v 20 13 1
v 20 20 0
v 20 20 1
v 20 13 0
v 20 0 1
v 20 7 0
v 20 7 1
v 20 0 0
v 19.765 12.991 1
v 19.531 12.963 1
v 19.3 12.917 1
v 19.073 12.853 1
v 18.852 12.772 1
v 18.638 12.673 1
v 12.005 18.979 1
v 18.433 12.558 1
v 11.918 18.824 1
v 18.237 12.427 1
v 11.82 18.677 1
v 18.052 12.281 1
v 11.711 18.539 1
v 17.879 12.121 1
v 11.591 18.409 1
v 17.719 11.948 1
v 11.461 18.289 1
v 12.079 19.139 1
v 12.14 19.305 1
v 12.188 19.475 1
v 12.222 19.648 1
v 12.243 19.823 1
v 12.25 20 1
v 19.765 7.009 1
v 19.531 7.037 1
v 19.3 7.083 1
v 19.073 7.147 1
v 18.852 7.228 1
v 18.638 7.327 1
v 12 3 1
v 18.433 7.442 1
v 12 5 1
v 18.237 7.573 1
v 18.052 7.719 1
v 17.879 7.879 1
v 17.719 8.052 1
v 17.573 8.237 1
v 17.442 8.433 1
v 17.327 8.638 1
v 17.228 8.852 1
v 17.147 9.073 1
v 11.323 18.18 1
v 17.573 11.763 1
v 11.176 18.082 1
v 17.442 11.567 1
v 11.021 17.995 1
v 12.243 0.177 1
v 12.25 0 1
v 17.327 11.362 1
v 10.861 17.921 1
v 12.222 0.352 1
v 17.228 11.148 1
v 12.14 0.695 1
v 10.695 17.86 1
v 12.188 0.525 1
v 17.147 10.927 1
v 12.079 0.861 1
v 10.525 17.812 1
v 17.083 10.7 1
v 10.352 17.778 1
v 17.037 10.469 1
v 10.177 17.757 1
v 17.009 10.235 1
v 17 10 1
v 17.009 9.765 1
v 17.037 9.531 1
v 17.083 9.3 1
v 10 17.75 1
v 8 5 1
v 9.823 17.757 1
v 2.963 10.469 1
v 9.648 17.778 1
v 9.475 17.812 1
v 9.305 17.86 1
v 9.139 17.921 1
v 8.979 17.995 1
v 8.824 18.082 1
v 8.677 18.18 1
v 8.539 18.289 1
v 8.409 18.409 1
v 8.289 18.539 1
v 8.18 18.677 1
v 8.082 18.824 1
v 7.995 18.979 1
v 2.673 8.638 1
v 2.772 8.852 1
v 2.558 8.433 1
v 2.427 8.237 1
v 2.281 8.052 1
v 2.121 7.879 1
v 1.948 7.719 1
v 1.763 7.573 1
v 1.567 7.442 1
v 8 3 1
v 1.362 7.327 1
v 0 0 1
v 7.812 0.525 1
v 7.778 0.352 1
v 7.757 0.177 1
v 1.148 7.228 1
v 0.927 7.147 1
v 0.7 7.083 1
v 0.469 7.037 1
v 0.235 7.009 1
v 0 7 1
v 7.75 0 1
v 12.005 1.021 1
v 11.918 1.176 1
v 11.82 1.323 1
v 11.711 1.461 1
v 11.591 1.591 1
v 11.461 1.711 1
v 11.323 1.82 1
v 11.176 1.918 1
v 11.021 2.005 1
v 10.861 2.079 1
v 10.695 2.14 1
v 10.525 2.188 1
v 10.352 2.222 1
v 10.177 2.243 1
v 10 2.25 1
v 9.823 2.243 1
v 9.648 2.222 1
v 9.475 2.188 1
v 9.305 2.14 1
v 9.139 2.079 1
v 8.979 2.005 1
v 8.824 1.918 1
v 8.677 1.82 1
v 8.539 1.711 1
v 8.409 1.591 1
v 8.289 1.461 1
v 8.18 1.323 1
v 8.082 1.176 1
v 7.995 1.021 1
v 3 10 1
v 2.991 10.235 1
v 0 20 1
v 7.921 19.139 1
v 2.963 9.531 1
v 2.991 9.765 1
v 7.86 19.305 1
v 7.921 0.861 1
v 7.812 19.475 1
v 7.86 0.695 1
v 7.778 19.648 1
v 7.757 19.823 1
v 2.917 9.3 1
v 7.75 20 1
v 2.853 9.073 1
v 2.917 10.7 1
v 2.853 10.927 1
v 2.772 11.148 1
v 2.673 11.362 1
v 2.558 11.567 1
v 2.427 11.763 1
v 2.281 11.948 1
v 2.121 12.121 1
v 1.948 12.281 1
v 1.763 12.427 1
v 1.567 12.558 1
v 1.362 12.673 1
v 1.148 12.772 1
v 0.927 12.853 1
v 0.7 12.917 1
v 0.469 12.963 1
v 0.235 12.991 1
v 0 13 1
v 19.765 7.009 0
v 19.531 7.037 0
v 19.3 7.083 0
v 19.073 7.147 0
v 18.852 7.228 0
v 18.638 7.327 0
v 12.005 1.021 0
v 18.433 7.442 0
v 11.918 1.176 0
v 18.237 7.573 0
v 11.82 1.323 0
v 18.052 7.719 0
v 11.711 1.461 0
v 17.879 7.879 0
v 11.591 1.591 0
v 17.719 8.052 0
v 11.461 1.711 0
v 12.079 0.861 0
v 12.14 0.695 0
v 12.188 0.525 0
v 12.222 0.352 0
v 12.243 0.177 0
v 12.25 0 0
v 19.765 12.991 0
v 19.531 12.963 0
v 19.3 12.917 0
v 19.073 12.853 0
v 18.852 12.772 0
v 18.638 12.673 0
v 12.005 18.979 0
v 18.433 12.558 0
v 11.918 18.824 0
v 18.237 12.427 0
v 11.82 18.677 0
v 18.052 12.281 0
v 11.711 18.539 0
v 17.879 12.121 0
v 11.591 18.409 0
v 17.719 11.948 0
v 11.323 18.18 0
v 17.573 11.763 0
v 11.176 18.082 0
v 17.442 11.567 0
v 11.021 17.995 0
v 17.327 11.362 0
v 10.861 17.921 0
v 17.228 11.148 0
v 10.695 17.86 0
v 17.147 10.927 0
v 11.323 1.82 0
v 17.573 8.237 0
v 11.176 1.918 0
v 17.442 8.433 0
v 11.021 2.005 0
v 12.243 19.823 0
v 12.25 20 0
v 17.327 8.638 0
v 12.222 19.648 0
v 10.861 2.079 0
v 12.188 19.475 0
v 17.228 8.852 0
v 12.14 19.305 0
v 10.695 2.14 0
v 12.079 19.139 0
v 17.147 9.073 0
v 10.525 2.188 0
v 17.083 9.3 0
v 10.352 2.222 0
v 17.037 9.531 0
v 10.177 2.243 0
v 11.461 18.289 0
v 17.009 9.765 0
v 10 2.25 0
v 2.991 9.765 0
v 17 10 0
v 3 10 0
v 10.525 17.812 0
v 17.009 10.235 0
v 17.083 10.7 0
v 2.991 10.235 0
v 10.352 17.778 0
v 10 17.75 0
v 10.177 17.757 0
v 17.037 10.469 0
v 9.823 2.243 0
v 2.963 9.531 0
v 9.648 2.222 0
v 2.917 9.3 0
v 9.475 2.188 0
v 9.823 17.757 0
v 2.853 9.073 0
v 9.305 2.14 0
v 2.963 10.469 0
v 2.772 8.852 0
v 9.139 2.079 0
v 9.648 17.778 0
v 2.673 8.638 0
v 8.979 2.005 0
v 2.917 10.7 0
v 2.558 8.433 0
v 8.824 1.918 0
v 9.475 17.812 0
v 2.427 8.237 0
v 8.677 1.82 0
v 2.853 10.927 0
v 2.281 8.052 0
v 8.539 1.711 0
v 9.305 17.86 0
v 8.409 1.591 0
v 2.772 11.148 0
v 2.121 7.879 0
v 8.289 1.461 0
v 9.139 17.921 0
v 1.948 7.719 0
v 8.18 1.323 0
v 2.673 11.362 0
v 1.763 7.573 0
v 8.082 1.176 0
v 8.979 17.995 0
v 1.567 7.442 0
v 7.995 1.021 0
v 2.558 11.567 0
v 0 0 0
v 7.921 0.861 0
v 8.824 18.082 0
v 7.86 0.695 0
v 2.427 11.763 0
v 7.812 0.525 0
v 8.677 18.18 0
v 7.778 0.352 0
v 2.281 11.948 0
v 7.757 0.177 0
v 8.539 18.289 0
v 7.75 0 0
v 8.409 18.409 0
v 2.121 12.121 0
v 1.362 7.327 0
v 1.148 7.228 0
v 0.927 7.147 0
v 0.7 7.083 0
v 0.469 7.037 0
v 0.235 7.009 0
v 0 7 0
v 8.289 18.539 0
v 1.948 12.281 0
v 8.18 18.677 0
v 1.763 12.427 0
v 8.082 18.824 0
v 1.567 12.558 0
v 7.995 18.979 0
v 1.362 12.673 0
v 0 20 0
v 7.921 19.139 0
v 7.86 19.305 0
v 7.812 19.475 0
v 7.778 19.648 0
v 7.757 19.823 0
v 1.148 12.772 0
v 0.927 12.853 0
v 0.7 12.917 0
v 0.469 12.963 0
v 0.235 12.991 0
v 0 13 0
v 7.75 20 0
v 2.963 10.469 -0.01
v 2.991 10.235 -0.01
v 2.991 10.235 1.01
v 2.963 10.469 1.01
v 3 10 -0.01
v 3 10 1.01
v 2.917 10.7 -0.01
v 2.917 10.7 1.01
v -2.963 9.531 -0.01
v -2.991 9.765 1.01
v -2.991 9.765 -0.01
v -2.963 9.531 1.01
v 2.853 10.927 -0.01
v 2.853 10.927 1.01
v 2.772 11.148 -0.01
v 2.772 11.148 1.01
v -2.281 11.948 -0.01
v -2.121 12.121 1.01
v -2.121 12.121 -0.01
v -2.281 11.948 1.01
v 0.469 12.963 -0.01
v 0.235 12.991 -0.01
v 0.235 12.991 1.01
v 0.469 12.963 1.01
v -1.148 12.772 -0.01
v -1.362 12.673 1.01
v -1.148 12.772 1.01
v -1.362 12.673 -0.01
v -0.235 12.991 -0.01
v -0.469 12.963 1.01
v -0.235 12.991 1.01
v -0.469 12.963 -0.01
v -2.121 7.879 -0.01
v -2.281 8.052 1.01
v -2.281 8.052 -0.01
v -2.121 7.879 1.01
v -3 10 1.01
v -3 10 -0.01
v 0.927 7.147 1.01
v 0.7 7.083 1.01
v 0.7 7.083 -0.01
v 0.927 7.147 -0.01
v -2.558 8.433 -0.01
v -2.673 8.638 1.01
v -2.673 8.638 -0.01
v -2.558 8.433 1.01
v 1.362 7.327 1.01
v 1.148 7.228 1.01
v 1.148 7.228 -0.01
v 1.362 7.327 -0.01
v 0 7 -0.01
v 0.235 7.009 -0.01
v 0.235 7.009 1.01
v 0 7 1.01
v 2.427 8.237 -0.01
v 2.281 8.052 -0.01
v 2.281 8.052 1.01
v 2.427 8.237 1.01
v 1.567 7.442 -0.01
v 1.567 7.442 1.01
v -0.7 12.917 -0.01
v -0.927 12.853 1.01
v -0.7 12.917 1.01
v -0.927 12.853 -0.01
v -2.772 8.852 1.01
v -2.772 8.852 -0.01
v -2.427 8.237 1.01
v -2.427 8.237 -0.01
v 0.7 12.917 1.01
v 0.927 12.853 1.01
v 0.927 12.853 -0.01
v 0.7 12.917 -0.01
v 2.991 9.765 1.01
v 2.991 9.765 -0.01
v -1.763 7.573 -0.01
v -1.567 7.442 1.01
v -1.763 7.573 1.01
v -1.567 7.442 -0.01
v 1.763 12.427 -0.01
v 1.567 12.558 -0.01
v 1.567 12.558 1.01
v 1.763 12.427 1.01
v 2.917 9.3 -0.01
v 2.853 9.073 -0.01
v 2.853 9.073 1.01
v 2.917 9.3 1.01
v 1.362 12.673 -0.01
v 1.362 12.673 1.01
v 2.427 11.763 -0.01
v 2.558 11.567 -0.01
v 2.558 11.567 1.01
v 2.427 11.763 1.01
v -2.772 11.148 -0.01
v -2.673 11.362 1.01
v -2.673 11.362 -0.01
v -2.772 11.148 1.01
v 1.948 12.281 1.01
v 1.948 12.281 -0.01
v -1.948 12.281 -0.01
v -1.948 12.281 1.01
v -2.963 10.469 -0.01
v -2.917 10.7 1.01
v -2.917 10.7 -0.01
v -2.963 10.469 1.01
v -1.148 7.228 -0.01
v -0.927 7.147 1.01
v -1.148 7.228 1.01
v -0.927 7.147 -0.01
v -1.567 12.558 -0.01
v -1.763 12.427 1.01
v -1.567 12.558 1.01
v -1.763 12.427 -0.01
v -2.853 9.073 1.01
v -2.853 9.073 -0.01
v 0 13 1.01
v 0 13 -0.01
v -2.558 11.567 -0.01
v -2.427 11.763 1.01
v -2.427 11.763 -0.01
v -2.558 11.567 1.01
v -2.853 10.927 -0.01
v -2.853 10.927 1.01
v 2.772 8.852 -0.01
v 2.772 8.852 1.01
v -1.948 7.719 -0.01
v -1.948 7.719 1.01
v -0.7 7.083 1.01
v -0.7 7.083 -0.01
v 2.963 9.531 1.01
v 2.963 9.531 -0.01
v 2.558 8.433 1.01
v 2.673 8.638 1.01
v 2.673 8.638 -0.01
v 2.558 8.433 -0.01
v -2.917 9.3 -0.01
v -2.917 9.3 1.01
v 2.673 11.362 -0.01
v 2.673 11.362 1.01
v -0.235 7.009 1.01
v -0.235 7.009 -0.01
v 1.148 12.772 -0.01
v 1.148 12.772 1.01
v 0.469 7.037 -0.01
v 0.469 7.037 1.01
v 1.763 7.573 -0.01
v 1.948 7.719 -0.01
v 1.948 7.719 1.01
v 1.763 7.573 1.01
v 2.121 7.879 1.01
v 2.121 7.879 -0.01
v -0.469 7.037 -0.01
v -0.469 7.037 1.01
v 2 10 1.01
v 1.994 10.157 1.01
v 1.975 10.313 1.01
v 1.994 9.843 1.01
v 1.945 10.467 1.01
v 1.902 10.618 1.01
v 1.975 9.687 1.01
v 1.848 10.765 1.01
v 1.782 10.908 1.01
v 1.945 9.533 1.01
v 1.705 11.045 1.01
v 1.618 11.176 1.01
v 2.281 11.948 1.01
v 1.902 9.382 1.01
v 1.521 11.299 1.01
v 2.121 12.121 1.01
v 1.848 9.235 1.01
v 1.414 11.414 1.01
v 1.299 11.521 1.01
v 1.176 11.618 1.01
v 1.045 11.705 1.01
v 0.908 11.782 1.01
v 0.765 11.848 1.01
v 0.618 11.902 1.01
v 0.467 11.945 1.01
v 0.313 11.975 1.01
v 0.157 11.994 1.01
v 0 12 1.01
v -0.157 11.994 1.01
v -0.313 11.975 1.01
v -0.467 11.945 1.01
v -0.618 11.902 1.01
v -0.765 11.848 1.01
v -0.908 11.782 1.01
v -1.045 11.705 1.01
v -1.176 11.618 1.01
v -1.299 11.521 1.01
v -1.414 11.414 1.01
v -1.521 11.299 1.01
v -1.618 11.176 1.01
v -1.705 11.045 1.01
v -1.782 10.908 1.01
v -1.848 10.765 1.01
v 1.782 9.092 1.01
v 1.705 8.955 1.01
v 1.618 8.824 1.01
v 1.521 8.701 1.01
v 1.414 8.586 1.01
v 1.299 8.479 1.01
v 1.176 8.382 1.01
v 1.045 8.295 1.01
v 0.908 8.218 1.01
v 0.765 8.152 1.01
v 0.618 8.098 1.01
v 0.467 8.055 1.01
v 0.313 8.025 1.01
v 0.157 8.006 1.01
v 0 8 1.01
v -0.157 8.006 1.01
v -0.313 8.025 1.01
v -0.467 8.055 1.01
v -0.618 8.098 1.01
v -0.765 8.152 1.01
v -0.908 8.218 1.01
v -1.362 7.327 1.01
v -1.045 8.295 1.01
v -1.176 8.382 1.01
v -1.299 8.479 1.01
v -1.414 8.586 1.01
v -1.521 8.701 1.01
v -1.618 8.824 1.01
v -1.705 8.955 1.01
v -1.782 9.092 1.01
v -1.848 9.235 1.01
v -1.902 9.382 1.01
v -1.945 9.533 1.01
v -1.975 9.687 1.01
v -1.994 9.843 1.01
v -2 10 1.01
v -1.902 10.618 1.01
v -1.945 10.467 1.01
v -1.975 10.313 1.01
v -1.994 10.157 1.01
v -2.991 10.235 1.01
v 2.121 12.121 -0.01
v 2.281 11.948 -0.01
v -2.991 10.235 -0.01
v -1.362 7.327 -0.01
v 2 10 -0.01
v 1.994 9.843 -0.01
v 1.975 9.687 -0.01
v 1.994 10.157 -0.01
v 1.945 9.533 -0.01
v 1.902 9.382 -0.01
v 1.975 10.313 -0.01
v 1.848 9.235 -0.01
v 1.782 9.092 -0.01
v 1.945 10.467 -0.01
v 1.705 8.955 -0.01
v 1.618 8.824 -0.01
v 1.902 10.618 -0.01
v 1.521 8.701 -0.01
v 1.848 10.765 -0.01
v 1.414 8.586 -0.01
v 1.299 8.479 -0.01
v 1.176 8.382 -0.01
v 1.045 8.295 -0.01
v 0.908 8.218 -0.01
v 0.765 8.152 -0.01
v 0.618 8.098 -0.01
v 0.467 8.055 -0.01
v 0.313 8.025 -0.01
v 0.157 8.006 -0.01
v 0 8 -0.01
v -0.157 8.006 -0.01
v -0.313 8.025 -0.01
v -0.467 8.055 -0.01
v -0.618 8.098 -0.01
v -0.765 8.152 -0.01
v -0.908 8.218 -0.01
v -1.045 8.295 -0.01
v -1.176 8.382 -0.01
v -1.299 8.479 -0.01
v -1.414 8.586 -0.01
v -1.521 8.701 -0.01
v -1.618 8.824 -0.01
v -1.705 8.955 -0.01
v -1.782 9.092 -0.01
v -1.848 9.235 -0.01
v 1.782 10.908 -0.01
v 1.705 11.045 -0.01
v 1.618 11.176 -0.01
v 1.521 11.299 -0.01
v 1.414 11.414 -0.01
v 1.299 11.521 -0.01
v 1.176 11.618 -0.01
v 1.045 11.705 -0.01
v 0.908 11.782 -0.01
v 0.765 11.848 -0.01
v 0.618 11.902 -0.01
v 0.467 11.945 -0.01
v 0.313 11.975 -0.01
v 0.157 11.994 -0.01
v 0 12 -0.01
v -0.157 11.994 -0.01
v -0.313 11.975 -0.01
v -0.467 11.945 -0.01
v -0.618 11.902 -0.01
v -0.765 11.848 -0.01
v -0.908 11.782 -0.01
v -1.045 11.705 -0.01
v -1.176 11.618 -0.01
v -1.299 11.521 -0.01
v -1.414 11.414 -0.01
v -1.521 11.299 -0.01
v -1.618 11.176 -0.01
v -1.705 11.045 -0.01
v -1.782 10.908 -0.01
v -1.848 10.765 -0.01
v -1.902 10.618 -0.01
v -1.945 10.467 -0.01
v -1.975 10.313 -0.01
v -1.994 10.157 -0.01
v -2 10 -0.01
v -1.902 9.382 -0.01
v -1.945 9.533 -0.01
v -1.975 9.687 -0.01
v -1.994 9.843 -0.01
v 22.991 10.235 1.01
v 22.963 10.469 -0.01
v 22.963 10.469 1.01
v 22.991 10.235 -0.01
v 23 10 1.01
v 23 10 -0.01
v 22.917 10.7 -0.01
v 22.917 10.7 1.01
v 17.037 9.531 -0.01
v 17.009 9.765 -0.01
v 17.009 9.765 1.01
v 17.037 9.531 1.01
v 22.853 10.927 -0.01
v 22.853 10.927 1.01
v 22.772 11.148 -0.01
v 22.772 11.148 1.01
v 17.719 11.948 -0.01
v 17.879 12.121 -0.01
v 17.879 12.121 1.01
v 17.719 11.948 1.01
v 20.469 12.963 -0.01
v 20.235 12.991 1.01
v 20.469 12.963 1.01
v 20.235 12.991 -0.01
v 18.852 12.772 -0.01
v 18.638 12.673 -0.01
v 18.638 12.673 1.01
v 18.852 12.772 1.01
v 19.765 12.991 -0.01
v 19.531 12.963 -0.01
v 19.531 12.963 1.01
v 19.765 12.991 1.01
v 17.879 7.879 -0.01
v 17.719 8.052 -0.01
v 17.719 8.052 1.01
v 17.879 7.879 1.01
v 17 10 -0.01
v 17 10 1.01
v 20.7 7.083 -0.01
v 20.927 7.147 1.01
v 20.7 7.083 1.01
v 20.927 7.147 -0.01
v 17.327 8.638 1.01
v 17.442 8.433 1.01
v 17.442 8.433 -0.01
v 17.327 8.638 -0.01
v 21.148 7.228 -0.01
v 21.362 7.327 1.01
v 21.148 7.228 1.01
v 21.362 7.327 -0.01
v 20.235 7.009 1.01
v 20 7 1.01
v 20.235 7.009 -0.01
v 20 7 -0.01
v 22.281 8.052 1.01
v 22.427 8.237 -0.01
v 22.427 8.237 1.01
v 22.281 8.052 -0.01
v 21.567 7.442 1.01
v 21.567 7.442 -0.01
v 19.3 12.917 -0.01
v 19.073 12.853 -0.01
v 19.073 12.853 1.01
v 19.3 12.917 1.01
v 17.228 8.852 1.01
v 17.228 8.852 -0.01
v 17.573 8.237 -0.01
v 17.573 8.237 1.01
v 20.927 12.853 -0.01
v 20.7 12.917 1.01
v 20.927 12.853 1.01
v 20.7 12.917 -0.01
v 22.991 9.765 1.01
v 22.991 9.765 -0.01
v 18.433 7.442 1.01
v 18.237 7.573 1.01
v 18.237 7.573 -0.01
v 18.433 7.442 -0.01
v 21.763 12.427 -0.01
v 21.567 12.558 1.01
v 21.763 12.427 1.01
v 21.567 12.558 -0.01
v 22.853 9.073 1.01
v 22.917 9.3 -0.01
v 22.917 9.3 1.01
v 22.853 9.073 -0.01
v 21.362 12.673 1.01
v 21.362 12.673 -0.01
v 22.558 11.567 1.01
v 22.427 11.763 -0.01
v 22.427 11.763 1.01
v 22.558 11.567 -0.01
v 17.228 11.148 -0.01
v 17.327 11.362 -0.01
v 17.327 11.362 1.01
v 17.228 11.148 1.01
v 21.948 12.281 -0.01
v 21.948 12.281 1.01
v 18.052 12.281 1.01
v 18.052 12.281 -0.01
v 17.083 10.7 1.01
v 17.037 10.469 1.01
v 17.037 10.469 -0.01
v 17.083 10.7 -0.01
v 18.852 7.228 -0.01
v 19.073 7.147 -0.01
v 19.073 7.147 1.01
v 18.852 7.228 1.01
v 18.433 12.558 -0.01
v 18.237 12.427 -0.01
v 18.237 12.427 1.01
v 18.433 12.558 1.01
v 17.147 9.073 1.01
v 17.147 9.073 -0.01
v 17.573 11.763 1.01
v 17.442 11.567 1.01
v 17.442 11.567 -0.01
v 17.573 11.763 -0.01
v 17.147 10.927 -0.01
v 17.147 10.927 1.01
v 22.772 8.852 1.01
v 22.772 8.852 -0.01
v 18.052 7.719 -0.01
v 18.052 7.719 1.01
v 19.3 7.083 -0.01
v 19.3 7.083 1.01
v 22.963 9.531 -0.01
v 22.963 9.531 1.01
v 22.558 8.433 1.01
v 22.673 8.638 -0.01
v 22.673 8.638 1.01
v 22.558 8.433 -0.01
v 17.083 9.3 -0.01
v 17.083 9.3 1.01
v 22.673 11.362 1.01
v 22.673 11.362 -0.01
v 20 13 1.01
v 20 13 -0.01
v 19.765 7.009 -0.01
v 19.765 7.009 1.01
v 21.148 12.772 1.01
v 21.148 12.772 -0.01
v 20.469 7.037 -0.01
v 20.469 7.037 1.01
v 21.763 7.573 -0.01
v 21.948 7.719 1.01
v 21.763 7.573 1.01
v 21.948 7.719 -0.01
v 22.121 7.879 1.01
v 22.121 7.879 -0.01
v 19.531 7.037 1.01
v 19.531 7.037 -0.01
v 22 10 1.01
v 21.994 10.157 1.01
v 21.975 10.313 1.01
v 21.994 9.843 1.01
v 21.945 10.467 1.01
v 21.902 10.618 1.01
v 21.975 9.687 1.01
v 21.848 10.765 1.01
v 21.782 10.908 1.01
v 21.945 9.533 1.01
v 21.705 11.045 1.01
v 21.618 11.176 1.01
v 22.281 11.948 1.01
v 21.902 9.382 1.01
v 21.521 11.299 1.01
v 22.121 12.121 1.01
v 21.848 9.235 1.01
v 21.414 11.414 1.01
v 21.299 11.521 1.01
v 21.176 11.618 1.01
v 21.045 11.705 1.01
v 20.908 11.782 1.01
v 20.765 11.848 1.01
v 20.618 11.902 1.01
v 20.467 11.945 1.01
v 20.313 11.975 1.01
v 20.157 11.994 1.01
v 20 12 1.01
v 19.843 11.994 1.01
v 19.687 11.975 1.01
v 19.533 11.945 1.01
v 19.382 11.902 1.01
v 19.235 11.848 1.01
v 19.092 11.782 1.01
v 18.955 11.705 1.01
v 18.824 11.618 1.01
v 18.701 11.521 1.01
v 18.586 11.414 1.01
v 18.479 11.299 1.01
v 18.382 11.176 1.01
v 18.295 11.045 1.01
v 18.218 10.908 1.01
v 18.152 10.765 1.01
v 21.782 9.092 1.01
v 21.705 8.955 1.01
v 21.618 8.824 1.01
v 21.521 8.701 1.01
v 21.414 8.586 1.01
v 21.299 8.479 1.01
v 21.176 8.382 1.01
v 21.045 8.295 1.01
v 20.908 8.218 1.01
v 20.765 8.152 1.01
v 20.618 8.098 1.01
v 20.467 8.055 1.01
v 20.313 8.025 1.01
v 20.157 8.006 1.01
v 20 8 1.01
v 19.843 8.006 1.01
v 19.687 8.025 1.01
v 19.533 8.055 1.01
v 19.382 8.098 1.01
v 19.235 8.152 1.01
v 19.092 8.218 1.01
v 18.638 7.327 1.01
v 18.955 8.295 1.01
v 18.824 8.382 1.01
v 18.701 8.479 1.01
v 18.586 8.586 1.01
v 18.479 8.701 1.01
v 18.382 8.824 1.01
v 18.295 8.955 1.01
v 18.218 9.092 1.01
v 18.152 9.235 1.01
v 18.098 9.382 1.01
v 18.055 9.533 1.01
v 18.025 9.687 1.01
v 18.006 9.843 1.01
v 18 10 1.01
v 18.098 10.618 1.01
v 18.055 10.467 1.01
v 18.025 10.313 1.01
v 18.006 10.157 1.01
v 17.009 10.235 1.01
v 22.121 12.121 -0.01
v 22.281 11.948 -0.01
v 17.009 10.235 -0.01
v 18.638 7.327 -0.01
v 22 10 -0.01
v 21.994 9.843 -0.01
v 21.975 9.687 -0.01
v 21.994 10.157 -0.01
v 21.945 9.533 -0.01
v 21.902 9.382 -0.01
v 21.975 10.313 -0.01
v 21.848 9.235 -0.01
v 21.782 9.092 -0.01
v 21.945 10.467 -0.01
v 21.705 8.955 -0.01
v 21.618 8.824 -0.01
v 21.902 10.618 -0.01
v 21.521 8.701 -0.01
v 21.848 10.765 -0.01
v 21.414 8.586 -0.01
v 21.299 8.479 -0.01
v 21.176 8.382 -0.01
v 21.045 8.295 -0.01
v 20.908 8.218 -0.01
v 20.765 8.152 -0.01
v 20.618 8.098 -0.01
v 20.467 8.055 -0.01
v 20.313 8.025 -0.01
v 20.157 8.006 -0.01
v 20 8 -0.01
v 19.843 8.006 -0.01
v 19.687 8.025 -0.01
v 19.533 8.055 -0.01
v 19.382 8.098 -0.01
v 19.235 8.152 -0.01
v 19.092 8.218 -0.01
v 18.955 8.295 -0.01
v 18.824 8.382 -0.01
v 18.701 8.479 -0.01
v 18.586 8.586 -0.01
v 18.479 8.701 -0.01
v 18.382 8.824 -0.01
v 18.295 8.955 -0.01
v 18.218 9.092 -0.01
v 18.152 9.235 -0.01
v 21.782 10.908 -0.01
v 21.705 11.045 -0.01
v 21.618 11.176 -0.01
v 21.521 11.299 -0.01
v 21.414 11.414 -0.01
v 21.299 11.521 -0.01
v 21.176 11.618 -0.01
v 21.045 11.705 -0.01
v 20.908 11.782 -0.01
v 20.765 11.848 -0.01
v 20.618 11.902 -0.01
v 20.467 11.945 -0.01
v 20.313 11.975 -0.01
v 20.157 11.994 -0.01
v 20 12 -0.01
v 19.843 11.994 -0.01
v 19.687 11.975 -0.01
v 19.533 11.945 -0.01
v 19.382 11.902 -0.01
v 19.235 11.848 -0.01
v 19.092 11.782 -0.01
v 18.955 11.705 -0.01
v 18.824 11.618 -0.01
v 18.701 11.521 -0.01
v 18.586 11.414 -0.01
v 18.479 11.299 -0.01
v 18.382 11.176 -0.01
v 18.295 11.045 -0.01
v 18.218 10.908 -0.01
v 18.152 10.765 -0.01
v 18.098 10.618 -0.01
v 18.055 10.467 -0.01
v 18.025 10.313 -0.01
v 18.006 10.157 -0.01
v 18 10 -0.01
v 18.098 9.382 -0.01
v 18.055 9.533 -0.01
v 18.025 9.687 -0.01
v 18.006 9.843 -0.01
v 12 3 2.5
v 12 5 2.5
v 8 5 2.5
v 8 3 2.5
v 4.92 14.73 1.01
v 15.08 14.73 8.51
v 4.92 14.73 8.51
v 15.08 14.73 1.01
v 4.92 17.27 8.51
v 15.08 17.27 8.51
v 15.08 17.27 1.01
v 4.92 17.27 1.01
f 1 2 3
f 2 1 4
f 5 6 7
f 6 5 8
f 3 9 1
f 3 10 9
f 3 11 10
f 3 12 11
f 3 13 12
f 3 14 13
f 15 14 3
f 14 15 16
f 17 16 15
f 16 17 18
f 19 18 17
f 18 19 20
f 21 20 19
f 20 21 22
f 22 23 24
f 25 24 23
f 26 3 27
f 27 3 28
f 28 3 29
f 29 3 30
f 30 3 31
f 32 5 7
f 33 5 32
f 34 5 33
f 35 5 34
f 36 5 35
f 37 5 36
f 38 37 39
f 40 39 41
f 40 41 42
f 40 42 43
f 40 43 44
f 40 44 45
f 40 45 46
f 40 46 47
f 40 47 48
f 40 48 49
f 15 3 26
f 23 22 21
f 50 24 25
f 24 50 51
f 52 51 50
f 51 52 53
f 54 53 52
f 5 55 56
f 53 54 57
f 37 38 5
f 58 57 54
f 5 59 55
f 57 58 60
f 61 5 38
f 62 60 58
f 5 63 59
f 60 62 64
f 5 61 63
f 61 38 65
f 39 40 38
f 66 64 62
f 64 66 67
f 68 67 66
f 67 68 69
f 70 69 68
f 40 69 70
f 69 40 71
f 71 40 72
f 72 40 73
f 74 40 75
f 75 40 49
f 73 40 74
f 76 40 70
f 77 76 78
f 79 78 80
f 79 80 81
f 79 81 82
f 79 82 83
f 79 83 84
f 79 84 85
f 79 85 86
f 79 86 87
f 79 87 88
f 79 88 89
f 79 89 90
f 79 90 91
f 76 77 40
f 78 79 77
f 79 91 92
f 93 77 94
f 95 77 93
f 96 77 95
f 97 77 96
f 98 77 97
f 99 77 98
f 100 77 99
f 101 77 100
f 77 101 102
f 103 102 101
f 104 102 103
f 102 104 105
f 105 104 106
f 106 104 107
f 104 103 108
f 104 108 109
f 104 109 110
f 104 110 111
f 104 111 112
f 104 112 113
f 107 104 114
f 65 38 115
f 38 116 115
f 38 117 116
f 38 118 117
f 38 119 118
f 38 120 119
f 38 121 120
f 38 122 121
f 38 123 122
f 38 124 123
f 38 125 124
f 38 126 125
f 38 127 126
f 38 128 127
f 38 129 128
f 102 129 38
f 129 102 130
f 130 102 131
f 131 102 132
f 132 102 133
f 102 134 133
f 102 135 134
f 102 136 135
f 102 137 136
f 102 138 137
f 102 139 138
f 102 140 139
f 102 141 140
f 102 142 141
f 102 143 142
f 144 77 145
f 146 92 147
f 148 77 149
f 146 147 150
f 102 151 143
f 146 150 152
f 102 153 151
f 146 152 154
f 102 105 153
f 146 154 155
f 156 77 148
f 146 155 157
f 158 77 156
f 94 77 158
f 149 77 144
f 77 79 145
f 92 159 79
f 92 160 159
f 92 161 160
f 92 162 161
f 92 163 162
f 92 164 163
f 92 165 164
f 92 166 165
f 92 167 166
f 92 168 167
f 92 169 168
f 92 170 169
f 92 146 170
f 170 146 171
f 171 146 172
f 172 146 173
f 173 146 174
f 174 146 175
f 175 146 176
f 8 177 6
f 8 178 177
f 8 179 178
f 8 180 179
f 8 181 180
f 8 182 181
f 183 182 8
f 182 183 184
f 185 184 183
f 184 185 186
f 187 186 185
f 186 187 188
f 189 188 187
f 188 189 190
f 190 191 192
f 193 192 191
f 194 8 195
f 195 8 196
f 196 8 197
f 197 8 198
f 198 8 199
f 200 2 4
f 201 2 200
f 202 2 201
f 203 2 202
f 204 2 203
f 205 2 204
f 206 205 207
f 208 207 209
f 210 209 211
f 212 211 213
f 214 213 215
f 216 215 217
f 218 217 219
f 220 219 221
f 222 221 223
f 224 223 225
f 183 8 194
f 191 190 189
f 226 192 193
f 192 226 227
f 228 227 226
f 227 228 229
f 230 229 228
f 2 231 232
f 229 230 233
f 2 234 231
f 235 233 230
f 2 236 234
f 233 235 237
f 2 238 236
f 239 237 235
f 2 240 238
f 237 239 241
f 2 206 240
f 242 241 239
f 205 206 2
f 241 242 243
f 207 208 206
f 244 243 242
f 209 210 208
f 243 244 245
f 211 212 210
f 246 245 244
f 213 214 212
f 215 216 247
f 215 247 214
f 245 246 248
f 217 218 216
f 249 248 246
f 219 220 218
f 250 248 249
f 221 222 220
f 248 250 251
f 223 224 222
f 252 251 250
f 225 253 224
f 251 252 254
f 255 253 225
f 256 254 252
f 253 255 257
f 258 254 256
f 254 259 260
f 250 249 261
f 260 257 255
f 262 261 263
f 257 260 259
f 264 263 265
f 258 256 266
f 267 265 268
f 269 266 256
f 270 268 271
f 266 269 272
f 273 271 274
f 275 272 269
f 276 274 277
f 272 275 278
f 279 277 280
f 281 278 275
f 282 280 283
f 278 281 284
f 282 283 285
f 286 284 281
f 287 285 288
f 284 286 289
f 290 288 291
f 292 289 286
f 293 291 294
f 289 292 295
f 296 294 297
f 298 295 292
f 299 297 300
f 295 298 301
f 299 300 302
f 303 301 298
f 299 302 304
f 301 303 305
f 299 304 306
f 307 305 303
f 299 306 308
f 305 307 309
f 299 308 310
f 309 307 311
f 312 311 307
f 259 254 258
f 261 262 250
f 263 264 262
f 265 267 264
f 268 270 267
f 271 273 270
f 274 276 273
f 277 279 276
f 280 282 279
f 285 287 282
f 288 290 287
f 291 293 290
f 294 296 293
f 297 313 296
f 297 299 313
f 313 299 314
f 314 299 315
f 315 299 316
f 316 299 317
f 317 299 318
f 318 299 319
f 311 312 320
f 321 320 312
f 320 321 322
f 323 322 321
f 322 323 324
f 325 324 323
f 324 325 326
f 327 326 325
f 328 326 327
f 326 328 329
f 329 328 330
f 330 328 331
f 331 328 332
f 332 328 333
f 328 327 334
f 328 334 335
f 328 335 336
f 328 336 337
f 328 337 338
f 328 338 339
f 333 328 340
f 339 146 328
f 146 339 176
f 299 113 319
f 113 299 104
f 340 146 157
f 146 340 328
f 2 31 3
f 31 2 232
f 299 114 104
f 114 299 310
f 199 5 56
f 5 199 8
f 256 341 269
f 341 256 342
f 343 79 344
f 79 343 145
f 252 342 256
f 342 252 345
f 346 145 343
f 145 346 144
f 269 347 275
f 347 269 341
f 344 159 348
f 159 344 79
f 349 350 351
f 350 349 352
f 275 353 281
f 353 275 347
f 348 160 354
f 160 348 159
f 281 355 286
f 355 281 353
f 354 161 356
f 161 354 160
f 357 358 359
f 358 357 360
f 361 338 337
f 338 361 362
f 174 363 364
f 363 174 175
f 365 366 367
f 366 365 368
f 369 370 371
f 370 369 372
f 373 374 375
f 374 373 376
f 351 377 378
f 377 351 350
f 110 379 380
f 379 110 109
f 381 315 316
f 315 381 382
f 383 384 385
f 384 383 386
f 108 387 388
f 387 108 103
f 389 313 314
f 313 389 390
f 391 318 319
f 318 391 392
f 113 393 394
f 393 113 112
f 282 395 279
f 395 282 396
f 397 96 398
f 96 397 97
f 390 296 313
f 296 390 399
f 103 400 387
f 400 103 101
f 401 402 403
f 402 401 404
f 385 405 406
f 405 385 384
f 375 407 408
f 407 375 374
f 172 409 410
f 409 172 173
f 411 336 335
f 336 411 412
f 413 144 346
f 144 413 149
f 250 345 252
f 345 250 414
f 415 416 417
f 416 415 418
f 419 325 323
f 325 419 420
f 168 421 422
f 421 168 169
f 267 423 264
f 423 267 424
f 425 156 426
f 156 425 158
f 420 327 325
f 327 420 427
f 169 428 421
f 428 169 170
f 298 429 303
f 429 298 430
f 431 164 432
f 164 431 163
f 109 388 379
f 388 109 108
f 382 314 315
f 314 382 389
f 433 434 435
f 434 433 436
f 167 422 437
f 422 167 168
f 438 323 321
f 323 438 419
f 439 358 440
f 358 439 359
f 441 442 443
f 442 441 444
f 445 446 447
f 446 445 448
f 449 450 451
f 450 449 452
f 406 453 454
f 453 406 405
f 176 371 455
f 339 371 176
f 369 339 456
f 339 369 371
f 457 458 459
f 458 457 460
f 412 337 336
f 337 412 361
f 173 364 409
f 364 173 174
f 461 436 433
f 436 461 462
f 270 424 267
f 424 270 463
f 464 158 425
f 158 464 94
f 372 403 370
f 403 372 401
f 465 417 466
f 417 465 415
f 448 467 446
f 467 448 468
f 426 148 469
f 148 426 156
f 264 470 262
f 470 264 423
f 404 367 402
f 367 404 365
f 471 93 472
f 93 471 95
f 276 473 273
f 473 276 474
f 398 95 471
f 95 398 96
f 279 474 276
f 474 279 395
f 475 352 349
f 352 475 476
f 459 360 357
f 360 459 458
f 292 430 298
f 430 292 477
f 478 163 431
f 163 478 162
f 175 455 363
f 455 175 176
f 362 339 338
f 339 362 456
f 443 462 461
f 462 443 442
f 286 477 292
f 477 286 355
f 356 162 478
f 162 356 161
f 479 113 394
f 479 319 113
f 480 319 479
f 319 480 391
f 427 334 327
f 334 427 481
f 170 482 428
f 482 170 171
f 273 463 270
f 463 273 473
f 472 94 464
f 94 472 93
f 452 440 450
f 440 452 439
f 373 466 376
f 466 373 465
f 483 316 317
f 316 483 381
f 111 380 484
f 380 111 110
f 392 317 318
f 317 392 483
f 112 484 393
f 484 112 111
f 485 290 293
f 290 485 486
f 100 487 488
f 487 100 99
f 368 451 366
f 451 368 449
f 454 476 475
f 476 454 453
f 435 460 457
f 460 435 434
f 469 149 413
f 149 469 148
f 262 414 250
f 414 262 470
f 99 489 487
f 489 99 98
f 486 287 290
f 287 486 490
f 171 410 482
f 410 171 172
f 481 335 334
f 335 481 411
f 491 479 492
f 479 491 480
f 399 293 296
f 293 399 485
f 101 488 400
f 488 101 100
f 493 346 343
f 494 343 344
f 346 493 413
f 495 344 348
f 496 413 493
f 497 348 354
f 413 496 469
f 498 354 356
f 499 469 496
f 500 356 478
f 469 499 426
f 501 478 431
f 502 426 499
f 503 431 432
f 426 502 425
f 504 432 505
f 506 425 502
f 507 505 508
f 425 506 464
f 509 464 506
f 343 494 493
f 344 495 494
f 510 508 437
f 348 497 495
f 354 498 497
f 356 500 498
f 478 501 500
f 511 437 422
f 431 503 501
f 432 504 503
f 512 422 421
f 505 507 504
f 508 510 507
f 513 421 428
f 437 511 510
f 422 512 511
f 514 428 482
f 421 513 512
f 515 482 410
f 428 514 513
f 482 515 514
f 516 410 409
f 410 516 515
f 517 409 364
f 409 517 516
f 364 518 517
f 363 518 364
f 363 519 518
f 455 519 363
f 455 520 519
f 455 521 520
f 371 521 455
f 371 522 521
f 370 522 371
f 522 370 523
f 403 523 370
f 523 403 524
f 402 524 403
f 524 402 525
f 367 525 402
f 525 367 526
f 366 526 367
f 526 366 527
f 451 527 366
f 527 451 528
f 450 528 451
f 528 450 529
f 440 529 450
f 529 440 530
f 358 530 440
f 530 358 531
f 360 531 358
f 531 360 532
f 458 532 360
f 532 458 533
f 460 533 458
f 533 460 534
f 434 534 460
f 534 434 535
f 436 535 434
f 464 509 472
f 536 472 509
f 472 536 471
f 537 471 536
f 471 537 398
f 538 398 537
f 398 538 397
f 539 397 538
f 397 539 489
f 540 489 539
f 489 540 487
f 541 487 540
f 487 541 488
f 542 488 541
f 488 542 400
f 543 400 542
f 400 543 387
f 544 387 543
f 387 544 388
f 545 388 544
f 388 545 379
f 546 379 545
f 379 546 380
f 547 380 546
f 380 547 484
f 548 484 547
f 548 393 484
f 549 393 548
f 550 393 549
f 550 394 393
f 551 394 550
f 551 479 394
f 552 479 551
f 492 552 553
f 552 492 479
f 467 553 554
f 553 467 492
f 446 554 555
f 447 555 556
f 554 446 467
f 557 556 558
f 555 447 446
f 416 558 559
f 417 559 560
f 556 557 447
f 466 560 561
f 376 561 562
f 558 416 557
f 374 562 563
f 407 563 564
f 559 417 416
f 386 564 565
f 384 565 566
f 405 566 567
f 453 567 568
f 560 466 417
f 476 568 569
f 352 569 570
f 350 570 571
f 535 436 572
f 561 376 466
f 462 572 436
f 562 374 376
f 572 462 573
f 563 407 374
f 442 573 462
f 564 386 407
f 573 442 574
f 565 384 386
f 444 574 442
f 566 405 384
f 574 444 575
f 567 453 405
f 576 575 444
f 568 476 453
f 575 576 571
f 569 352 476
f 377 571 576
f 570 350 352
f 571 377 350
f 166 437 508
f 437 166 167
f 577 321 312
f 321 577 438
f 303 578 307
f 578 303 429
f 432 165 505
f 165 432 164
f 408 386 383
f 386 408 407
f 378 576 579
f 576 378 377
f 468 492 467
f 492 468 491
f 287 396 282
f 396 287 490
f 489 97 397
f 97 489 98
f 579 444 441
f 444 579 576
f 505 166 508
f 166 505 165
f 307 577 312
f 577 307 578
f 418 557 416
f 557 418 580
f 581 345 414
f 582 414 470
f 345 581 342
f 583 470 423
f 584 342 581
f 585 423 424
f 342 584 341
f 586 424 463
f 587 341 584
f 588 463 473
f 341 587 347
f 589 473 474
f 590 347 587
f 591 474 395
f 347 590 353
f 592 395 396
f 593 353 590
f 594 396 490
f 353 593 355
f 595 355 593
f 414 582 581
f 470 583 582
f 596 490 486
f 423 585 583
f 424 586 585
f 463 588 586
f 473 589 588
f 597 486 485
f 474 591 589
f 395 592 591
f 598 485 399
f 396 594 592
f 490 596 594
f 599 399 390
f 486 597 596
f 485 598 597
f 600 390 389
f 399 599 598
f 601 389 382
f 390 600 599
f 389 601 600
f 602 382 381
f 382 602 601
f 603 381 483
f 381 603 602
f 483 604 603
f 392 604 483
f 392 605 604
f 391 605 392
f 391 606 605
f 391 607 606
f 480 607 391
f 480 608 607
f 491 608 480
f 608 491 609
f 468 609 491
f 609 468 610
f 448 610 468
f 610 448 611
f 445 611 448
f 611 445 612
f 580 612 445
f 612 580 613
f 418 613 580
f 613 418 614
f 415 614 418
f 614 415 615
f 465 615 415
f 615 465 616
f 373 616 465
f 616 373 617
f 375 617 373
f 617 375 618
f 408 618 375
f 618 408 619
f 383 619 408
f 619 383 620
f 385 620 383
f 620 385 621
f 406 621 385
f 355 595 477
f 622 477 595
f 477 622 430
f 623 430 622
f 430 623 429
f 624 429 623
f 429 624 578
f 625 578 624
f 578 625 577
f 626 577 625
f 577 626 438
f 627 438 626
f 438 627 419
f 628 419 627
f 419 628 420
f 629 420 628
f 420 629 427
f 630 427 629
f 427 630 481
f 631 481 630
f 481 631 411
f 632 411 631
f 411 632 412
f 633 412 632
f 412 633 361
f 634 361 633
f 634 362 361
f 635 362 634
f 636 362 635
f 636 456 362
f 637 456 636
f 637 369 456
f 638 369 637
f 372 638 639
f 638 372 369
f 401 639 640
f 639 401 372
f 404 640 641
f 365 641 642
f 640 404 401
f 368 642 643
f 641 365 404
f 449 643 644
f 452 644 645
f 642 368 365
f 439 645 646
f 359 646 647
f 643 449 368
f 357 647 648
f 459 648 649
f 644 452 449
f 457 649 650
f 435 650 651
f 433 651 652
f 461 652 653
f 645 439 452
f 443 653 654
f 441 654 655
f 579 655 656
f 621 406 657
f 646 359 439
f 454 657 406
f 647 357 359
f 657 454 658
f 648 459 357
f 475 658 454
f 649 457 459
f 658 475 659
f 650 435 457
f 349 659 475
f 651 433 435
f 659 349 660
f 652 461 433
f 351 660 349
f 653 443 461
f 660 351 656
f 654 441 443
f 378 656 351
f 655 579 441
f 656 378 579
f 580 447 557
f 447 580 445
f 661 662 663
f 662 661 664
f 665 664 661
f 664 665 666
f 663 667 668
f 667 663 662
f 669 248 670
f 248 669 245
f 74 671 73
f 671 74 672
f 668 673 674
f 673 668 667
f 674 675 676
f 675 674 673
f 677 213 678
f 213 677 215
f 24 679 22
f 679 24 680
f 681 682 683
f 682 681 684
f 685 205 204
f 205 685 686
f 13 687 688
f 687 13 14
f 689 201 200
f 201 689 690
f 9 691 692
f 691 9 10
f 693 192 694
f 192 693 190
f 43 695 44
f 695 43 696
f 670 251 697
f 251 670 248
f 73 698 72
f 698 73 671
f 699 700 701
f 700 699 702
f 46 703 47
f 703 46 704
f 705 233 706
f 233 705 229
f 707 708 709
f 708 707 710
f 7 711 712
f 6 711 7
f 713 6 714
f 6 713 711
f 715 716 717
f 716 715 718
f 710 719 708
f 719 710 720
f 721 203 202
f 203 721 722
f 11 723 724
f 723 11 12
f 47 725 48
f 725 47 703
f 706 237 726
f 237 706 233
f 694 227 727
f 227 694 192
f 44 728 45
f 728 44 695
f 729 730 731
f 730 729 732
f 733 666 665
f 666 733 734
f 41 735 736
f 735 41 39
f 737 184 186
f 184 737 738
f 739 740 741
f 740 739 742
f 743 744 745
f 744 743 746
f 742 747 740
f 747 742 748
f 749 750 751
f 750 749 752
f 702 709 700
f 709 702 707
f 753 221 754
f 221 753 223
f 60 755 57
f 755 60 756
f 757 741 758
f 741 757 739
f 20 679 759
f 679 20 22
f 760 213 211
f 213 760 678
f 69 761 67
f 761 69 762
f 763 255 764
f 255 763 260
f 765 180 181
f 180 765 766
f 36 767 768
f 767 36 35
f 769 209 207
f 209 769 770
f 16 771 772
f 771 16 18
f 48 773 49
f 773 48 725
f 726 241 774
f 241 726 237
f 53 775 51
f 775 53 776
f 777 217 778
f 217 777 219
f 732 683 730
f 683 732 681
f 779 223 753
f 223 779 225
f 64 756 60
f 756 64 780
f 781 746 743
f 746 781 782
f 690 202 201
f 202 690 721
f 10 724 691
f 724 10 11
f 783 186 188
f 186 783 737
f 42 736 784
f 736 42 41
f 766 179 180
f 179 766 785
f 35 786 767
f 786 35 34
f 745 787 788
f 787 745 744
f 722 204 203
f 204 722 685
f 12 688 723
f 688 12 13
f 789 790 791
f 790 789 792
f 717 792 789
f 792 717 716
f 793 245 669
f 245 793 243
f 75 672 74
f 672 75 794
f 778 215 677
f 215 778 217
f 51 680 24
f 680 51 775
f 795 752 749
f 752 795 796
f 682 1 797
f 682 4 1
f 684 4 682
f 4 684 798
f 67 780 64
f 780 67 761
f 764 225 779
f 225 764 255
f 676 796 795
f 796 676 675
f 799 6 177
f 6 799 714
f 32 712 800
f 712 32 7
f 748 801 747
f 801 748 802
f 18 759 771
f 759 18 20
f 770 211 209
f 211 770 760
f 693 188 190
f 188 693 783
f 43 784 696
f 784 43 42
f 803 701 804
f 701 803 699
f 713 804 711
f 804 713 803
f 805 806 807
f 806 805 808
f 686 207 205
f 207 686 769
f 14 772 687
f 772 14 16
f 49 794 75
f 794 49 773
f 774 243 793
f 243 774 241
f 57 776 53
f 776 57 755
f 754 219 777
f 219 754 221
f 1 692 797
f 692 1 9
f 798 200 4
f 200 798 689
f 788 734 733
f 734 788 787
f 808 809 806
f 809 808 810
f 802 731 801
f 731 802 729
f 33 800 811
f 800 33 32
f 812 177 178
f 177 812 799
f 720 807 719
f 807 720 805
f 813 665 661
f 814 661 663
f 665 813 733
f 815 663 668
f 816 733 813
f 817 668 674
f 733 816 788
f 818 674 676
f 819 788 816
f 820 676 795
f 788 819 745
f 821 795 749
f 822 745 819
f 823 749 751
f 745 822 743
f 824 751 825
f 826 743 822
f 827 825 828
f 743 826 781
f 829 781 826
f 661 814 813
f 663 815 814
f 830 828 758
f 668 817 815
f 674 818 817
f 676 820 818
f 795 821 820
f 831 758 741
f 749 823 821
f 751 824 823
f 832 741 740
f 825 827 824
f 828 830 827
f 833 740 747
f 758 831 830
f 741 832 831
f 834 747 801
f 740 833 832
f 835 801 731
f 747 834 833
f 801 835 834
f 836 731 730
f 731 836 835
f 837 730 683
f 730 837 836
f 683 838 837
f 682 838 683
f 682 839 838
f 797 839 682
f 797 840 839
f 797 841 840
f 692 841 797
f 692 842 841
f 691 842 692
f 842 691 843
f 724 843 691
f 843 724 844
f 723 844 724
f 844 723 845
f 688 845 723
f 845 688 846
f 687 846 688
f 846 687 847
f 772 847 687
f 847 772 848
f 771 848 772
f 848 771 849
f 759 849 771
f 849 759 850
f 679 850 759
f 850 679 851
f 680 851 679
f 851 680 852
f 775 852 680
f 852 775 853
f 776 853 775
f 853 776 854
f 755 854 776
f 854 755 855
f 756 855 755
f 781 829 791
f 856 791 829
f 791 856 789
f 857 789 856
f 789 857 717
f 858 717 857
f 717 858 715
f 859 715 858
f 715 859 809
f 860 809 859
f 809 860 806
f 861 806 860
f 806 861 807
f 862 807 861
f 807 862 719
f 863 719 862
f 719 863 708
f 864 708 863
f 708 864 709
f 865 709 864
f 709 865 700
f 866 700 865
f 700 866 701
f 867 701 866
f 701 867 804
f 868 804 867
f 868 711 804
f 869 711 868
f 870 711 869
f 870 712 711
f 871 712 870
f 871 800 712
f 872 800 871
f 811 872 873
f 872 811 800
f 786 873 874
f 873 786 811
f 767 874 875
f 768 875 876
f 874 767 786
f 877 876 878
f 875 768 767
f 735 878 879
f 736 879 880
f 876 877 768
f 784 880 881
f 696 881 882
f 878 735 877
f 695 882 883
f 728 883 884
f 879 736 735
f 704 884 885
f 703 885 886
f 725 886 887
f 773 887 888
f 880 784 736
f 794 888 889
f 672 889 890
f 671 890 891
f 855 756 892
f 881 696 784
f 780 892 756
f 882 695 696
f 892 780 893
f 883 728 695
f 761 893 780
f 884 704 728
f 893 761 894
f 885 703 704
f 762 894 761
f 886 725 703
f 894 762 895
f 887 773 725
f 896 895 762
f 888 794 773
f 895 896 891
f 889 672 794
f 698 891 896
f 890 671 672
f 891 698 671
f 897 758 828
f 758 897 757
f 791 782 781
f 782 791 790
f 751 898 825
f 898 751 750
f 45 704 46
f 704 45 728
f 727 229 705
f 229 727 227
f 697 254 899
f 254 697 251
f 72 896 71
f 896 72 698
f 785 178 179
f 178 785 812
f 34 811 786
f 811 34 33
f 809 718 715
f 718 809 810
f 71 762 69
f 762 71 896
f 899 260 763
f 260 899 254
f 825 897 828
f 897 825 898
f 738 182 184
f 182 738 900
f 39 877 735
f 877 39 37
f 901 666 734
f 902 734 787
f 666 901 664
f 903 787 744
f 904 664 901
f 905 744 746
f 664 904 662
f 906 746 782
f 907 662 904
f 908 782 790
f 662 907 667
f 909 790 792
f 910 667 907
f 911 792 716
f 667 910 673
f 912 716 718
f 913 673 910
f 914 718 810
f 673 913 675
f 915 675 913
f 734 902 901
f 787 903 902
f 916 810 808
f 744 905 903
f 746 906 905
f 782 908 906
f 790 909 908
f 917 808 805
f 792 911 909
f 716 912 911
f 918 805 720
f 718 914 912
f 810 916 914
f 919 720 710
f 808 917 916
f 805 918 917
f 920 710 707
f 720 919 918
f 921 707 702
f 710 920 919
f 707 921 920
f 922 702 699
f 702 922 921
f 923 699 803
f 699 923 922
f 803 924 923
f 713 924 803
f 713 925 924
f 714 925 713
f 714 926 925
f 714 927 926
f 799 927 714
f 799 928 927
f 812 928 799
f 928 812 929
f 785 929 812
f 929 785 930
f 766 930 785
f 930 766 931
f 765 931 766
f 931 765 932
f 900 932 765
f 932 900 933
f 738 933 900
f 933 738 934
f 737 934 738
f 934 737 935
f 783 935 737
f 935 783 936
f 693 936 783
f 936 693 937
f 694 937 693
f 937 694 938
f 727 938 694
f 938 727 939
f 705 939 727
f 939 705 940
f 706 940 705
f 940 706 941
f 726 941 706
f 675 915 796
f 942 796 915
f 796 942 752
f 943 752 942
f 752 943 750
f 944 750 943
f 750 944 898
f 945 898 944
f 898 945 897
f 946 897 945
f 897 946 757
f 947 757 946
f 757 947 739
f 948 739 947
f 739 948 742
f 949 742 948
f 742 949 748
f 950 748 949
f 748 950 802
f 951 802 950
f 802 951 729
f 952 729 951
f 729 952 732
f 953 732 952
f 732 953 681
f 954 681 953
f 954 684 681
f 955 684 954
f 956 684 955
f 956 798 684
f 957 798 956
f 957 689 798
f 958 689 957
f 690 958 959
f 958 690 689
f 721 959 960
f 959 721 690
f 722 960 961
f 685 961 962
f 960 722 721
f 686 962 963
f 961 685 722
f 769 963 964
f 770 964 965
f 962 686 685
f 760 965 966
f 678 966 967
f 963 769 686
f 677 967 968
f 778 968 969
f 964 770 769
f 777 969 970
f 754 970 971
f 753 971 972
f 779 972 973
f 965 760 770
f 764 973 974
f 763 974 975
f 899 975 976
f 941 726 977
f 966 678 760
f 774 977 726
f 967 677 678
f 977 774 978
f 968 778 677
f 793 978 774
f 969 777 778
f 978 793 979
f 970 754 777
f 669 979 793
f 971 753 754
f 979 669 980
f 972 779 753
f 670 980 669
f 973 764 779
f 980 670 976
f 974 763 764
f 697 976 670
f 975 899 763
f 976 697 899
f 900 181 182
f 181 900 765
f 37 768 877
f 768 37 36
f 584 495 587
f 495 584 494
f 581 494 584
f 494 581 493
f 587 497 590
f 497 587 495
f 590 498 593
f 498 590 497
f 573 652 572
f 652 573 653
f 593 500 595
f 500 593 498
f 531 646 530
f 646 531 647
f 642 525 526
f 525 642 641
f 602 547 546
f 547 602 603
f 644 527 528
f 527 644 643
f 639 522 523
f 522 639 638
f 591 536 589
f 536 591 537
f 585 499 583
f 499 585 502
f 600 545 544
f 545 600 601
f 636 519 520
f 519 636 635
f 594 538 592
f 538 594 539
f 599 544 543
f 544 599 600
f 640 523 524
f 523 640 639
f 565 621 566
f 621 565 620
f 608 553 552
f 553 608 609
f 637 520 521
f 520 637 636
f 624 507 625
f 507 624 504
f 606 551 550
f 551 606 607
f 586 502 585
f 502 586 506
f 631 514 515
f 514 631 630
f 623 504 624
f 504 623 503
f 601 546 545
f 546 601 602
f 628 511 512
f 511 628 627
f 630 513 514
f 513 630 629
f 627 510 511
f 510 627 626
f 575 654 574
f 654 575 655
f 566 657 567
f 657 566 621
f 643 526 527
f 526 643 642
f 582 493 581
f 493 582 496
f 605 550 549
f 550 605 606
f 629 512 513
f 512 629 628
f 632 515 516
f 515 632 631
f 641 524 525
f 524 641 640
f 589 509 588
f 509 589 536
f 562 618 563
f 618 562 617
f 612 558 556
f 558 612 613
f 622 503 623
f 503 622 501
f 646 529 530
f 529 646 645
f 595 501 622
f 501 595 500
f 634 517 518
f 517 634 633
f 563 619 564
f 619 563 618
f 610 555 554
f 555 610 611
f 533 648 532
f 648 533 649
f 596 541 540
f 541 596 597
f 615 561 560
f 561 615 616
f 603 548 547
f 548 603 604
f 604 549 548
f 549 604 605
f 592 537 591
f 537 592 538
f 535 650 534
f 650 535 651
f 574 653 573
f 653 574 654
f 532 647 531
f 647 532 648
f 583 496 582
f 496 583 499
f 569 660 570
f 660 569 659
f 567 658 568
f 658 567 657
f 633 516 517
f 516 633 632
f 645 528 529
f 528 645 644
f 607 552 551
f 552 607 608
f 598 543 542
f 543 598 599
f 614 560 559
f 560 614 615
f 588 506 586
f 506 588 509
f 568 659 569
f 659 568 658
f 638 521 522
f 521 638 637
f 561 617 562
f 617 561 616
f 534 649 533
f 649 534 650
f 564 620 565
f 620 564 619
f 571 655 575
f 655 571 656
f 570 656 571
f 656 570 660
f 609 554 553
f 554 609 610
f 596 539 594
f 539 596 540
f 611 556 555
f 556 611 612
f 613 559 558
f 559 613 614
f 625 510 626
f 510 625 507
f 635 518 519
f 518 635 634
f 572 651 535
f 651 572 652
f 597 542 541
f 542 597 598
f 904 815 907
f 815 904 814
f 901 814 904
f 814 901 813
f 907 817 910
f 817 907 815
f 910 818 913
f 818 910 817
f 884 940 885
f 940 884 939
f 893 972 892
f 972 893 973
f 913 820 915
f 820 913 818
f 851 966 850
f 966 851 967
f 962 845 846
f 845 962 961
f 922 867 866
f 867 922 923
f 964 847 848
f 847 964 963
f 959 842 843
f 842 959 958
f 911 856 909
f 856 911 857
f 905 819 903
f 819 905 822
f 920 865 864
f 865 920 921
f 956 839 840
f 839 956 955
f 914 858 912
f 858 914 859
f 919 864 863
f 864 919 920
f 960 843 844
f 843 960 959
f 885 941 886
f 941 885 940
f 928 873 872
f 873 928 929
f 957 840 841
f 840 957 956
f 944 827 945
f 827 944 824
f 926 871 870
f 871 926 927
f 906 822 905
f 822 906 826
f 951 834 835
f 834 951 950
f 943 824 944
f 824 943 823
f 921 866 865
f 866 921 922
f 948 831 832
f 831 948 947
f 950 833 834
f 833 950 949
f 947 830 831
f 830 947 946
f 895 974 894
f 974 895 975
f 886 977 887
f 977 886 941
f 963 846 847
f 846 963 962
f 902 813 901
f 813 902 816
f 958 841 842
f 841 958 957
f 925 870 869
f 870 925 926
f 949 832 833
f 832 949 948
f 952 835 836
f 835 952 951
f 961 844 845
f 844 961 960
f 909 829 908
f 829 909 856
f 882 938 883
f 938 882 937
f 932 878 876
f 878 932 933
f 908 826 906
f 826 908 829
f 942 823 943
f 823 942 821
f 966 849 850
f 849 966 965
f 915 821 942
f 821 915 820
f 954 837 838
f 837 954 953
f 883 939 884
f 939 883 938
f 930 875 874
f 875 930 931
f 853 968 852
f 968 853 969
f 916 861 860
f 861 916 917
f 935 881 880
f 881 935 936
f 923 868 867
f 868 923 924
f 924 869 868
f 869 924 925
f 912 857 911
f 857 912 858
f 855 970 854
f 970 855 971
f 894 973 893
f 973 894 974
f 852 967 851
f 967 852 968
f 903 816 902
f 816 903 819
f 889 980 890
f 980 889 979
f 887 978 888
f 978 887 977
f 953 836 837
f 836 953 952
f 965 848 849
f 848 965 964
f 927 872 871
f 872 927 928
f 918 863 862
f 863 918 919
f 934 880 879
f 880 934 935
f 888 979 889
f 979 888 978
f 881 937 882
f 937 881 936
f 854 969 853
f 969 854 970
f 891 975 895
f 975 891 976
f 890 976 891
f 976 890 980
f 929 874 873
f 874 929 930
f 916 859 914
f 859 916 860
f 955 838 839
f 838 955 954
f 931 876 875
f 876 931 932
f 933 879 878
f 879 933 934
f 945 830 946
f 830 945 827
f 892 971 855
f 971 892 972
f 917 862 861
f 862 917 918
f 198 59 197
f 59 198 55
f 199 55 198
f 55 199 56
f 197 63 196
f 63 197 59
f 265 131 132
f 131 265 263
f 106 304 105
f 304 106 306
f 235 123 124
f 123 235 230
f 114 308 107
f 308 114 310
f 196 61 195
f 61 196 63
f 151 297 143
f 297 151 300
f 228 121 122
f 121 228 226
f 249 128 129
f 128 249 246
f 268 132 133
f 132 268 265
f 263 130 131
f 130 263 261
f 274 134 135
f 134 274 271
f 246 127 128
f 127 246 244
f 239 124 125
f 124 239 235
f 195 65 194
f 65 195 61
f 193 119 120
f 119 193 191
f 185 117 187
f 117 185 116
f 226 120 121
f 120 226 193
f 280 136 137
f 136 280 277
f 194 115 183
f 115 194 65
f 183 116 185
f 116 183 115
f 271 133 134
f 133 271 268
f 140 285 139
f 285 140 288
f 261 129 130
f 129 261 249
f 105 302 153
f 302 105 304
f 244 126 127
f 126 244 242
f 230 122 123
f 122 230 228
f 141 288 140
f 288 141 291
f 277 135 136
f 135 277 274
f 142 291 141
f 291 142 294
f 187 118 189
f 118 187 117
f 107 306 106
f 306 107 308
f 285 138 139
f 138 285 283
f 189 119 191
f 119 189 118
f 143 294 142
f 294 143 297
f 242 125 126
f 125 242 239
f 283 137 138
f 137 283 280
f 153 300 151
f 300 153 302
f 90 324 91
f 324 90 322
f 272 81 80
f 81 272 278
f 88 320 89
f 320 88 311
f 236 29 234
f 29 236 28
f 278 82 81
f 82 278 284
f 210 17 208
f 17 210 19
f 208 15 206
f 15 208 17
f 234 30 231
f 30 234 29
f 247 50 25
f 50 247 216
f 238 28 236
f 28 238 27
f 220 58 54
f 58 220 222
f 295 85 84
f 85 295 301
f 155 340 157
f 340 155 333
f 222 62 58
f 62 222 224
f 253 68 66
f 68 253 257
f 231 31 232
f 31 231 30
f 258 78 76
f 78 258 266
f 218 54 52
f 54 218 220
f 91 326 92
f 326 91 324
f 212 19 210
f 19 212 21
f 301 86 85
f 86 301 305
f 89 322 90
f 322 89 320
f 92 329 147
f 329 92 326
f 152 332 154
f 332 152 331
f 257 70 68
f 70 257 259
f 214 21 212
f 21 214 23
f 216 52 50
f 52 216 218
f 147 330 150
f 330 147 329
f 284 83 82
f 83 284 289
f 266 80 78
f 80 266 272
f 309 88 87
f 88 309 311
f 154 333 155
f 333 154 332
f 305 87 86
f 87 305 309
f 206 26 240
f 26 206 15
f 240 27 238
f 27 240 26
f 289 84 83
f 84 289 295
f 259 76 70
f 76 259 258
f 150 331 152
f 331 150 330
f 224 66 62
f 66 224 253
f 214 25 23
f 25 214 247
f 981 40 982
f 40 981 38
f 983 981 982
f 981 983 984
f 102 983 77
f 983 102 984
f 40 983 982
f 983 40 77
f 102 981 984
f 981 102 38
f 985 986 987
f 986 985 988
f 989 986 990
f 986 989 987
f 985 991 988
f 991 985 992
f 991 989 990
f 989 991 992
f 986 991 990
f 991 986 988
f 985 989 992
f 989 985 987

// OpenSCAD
// file: pins.scad
module socket(count, spacing=2.54)
{
    // Component-specific parameters
    socket_color = "black";
    socket_z = 7.5;

    pin_color = "lightgray";
    pin_radius = spacing/4;
    pin_z = 2;


    // Solder pin
    // color(pin_color)
    // translate([spacing/2, spacing/2, -pin_z])
    // cylinder(
    //         r = pin_radius,
    //         h = pin_z + nothing
    //     );

    // Socket
    color(socket_color)
    translate([-spacing/2, 0, 0])
    cube([spacing, count*spacing, socket_z]);
}


module pins(count, spacing=2.54)
{
    socket(count, spacing);

    // TODO...
}
// file: ../electronics/config.scad
// Rendering: Level of detail
$fn = 80;

// Quickfix for rendering artifacts on overlapping surfaces
nothing = 0.01;

/*
 * Globally relevant model parameters
 */
adapter_pcb_size_x = 26;
adapter_pcb_size_y = 29;
adapter_pcb_size_z = 1.0;
adapter_pin_spacing = 2.54;

sensor_pcb_size_x = 20;
sensor_pcb_size_y = 20;
sensor_pcb_size_z = 1.0;

led_socket_pin_spacing = 2.54;
led_socket_pin_count = 4;
led_socket_size_x = led_socket_pin_count * led_socket_pin_spacing;
led_diameter = 5.0;
// main file
include <../electronics/config.scad>;
use <pins.scad>;


/**
 * Seeedstudio Grove module:
 * Digital light sensor with AMS TSL2561
 *
 * https://wiki.seeedstudio.com/Grove-Digital_Light_Sensor/
 * https://wiki.seeedstudio.com/Grove_System/
 * https://ams.com/tsl2561
 */
module sensor_pcb(
            // PCB outline
            pcb_color = "darkblue",
            pcb_size_x = sensor_pcb_size_x,
            pcb_size_y = sensor_pcb_size_y,
            pcb_size_z = sensor_pcb_size_z,

            // PCB cutouts
            ears_inner_d = 2.0,
            ears_outer_d = 3.0,

            hole_d = 4.5,

            // Sensor IC parameters
            sensor_color = "lightgray",
            sensor_size_x = 4,
            sensor_size_y = 2,
            sensor_size_z = 1.5,
            sensor_inset_x = 8.0,
            sensor_inset_y = 3.0,

            // Pin socket parameters
            pin_spacing = 2.54,
            pin_count = 4,
            pins_inset_y = 16.0
        )
{
    // Pins sentered on X axis
    pins_inset_x = pcb_size_x/2 - pin_count*pin_spacing/2;

    difference()
    {
        color(pcb_color)
        union()
        {
            // Main body
            cube([
                pcb_size_x,
                pcb_size_y,
                pcb_size_z
            ]);

            // Ear left
            translate([
                0,
                pcb_size_y/2,
                -nothing
            ])
            cylinder(
                    r = ears_outer_d,
                    h = pcb_size_z + 2*nothing
                );

            // Ear right
            translate([pcb_size_x, pcb_size_y/2, -nothing])
            cylinder(
                    r = ears_outer_d,
                    h = pcb_size_z + 2*nothing
                );
        }

        // Bottom edge hole
        translate([
            pcb_size_x/2,
            0,
            -nothing
        ])
        cylinder(
            r = hole_d/2,
            h = pcb_size_z + 2*nothing
        );

        // Top edge hole
        translate([
            pcb_size_x/2,
            pcb_size_y,
            -nothing
        ])
        cylinder(
            r = hole_d/2,
            h = pcb_size_z + 2*nothing
        );

        union()
        {
            // Ear hole left
            translate([
                0,
                pcb_size_y/2,
                -2*nothing
            ])
            cylinder(
                r = ears_inner_d,
                h = pcb_size_z + 4*nothing
            );

            // Ear hole right
            translate([
                pcb_size_x,
                pcb_size_y/2,
                -2*nothing
            ])
            cylinder(
                r = ears_inner_d,
                h = pcb_size_z + 4*nothing
            );
        }
    }

    // SMD sensor IC
    color(sensor_color)
    translate([
        sensor_inset_x,
        sensor_inset_y,
        pcb_size_z-nothing
    ])
    cube([
        sensor_size_x,
        sensor_size_y,
        sensor_size_z+nothing
    ]);

    // Pin socket
    translate([
        pins_inset_x,
        pins_inset_y,
        pcb_size_z+nothing
    ])
    rotate([0, 0, -90])
    socket(count=pin_count, spacing=pin_spacing);
};

sensor_pcb();
